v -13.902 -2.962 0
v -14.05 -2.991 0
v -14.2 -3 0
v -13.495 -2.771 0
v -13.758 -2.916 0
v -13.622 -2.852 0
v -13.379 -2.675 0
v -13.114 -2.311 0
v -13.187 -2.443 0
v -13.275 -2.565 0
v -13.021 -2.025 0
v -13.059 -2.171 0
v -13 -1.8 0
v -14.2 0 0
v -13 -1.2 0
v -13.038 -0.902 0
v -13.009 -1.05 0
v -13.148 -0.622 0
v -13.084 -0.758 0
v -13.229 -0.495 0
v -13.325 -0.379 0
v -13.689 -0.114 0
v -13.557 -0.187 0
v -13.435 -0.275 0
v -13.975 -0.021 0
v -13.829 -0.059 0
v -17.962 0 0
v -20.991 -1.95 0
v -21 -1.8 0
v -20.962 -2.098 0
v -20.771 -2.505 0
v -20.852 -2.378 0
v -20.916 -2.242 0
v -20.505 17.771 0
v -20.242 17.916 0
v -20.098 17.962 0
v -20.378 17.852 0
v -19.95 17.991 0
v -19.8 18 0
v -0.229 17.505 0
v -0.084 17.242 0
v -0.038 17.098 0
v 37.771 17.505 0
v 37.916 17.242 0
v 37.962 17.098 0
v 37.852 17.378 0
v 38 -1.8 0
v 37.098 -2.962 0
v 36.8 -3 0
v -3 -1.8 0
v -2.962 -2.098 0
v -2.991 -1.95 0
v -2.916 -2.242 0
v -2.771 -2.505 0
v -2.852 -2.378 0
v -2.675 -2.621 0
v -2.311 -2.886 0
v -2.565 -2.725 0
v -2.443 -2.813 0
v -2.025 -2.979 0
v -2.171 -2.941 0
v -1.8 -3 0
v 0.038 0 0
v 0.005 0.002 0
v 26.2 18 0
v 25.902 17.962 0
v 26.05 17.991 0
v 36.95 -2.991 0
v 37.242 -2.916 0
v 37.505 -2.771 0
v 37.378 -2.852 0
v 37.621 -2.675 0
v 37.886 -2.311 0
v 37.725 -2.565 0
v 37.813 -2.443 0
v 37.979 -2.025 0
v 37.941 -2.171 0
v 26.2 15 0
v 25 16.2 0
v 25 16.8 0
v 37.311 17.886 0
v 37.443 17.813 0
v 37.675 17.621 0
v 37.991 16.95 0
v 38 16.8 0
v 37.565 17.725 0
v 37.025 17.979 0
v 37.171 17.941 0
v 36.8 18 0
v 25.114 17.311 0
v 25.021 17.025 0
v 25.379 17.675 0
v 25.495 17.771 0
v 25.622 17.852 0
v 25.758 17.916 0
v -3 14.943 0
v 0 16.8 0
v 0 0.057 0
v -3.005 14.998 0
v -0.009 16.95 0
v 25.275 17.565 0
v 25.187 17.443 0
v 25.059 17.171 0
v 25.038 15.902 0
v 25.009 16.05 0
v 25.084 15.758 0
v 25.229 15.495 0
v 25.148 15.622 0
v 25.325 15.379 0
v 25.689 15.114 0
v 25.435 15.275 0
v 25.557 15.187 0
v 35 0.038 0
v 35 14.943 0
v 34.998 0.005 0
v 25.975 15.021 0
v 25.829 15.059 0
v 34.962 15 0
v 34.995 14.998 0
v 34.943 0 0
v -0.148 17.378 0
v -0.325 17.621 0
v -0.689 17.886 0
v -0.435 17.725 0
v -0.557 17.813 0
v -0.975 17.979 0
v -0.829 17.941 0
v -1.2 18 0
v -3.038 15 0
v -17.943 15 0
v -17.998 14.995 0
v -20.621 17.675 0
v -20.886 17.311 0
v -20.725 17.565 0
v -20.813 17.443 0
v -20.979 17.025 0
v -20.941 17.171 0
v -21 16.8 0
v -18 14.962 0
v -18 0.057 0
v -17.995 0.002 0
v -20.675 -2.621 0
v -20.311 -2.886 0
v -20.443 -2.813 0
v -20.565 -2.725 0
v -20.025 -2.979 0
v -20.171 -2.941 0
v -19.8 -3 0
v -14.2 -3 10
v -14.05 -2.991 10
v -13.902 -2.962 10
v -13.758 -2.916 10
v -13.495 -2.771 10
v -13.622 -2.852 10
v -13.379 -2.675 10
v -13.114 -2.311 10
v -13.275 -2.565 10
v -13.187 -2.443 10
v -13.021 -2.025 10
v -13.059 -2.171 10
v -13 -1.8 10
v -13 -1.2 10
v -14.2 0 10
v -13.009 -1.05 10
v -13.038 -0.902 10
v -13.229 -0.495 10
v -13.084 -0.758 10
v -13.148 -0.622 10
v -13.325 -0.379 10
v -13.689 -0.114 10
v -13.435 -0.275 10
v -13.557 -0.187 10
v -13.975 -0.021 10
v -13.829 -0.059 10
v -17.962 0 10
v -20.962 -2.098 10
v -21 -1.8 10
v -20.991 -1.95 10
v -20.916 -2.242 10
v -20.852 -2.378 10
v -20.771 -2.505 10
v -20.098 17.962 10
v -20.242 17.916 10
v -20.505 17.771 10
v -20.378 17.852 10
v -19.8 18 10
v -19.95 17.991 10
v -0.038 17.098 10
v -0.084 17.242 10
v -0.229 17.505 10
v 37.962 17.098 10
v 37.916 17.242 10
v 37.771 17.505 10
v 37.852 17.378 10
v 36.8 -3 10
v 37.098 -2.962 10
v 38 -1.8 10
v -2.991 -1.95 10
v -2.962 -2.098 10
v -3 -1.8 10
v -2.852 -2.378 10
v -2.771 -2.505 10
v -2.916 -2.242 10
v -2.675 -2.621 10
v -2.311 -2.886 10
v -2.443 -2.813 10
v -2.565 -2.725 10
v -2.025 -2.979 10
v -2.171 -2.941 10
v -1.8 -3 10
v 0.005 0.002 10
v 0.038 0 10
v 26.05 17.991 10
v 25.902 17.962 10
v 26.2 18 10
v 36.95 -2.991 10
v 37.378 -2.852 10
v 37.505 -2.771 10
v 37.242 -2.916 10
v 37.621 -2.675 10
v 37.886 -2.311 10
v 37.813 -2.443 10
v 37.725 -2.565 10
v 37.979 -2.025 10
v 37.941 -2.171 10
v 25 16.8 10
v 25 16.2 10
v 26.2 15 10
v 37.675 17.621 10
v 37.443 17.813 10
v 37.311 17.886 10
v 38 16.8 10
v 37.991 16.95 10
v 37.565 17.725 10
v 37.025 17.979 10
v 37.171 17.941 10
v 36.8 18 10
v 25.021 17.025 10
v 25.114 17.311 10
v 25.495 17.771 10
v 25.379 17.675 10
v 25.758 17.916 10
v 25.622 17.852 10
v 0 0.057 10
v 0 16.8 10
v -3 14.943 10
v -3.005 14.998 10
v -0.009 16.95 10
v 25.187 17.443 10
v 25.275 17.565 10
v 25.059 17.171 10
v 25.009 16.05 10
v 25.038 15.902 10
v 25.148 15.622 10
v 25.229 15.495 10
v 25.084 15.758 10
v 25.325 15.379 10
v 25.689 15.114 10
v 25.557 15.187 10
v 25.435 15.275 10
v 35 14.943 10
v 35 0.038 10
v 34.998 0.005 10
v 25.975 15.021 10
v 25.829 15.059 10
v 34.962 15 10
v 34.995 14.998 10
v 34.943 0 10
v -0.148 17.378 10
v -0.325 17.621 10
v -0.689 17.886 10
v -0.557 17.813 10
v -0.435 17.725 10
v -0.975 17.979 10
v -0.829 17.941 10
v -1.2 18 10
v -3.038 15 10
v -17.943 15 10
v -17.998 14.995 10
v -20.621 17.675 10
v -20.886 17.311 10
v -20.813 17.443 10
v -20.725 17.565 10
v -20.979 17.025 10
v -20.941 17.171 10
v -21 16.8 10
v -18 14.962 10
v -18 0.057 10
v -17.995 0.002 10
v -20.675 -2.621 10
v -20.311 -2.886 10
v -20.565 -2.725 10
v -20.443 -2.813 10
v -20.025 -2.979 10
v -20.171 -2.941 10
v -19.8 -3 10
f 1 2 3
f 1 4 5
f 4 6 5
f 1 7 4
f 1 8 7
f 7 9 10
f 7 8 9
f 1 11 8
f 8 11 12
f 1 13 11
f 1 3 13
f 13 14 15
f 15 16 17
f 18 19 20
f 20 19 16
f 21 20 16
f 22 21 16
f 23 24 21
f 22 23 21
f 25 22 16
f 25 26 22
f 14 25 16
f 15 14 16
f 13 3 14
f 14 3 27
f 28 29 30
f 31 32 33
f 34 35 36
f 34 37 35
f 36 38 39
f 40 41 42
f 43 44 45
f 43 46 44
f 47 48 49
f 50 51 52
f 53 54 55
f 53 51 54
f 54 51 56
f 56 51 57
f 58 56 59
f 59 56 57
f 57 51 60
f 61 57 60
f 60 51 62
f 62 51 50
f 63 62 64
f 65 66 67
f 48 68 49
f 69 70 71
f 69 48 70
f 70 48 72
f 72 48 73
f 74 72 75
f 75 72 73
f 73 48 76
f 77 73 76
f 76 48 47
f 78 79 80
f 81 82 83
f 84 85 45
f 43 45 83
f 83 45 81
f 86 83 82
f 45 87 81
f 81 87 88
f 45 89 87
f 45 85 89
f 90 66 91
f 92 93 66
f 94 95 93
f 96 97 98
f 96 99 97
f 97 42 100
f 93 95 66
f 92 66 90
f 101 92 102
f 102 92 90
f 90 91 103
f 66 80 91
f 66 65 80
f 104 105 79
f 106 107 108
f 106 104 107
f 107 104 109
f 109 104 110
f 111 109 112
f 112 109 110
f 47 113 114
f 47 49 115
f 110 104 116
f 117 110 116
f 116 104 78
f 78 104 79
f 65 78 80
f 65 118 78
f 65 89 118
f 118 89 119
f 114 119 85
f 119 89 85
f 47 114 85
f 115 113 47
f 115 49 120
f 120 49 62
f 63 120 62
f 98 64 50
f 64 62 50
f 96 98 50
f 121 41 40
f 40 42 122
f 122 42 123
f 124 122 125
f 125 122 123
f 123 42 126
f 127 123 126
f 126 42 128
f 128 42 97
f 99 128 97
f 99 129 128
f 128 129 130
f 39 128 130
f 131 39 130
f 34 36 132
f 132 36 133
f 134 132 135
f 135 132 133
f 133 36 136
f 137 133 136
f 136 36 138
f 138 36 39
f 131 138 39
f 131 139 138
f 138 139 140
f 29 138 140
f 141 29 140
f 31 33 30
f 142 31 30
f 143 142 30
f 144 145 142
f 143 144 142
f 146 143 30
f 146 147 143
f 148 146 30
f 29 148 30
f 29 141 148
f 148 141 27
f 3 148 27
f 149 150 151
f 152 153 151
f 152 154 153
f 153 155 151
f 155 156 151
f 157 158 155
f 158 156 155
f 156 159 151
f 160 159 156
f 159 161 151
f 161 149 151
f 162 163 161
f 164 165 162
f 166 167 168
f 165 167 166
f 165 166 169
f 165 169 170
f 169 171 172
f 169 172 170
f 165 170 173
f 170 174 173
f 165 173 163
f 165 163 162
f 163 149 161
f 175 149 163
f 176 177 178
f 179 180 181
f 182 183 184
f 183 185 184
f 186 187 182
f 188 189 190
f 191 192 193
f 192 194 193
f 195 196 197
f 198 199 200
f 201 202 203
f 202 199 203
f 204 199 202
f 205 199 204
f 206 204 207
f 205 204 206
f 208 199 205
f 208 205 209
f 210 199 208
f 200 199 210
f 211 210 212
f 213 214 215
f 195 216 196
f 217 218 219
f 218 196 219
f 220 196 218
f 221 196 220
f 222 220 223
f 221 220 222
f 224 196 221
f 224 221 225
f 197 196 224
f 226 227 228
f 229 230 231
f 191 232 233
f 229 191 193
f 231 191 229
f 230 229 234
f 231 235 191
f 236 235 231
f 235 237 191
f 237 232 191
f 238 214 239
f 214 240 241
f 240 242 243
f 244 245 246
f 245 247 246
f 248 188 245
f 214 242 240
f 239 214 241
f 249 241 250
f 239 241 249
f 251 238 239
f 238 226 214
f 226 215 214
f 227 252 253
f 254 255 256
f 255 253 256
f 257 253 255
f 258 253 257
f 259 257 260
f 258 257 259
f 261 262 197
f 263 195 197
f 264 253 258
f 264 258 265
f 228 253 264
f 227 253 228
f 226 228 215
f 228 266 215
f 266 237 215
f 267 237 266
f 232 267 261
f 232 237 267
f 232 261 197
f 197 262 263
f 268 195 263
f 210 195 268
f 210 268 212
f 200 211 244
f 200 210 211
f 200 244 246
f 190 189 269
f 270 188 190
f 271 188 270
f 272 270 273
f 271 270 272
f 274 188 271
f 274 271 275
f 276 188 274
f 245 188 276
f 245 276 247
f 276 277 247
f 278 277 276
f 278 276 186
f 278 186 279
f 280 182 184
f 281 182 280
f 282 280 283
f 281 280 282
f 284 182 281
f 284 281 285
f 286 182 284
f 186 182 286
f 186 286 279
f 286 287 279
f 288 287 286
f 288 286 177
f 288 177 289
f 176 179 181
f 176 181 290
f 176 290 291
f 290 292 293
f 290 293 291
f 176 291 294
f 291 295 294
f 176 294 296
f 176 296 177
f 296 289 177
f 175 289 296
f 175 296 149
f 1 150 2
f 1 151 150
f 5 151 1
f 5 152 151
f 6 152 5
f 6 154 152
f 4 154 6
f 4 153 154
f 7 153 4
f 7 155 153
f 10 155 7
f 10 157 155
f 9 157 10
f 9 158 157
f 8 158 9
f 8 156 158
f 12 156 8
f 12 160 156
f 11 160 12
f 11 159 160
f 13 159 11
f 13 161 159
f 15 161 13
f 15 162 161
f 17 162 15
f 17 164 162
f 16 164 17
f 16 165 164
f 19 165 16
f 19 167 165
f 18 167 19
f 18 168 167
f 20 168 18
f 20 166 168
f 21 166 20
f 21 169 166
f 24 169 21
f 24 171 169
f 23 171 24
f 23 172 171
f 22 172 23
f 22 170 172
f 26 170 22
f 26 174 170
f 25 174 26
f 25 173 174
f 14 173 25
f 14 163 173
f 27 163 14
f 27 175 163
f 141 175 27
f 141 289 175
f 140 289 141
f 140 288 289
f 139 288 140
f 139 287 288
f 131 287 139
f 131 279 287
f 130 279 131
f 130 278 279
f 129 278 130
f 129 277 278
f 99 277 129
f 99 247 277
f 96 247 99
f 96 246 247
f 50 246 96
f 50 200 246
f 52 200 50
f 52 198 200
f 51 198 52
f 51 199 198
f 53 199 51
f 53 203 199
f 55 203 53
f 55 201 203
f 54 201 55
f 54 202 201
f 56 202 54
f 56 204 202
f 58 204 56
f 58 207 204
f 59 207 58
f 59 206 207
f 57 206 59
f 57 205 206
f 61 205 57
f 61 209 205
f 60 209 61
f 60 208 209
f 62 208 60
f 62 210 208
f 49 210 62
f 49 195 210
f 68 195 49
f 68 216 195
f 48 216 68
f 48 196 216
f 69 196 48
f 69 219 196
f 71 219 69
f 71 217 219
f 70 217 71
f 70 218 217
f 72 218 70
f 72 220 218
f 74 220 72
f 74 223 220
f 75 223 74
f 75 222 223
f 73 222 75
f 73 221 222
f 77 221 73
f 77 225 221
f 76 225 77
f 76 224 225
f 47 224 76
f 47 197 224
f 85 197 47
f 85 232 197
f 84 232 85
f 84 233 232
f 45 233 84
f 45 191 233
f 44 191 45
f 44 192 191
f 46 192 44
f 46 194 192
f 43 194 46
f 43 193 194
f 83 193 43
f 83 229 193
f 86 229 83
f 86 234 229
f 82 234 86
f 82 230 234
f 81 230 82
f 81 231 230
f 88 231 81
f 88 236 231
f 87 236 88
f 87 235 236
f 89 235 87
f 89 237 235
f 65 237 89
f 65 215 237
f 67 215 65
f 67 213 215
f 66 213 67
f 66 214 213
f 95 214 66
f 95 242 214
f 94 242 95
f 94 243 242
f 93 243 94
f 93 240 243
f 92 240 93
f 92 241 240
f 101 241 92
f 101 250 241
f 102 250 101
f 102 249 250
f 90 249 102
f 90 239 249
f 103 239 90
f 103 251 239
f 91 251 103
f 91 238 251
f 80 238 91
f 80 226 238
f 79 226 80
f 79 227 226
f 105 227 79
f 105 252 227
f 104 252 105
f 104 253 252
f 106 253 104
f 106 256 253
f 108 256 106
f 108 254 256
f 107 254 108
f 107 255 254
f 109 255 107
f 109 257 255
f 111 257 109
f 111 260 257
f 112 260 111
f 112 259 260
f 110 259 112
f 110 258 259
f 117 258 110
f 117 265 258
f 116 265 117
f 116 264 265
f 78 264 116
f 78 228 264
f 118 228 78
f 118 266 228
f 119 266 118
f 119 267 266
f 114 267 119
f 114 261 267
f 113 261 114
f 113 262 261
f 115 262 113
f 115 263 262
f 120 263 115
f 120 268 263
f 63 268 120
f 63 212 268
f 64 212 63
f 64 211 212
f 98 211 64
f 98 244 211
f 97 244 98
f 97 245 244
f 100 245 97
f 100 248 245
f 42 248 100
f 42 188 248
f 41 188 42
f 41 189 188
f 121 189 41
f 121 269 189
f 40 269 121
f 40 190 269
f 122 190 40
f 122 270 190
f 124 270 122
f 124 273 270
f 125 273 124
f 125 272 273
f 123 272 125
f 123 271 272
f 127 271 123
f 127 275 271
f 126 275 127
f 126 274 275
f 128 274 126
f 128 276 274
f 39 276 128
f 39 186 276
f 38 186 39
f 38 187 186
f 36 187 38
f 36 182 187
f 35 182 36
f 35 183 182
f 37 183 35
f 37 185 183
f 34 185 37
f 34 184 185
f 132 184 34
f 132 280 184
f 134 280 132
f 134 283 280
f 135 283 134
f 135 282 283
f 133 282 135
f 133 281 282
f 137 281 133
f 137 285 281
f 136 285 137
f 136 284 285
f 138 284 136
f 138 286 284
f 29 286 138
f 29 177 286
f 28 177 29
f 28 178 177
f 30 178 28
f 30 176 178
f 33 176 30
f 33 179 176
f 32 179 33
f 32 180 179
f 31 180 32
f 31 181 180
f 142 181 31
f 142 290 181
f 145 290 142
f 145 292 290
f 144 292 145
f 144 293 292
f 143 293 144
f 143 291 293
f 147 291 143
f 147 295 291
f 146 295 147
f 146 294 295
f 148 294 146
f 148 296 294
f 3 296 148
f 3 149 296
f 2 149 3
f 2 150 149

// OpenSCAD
// oven rail  25 x 15

THICK = 3;


module shape(x1, x2, y) {
    // x1 - opened x part 
    // x2 - closed x part
    // x total = x1 + x2
    difference(){

        offset(delta=THICK, $fn=50)
            square([x1 + x2 , y ]);

        union(){    
            square([x1 + x2 , y ]);
            square([x1 , y + THICK ]);
        }
    }
}

linear_extrude(height=10)
offset(r=1.2,  $fn=50) offset(r=-1.2,  $fn=50)
union(){
    //bigger C
    shape(25, 10, 15);

    //smaller C
    rotate([0,0,180])
    translate([THICK,-15,0])
    shape(10, 5, 15);
}
